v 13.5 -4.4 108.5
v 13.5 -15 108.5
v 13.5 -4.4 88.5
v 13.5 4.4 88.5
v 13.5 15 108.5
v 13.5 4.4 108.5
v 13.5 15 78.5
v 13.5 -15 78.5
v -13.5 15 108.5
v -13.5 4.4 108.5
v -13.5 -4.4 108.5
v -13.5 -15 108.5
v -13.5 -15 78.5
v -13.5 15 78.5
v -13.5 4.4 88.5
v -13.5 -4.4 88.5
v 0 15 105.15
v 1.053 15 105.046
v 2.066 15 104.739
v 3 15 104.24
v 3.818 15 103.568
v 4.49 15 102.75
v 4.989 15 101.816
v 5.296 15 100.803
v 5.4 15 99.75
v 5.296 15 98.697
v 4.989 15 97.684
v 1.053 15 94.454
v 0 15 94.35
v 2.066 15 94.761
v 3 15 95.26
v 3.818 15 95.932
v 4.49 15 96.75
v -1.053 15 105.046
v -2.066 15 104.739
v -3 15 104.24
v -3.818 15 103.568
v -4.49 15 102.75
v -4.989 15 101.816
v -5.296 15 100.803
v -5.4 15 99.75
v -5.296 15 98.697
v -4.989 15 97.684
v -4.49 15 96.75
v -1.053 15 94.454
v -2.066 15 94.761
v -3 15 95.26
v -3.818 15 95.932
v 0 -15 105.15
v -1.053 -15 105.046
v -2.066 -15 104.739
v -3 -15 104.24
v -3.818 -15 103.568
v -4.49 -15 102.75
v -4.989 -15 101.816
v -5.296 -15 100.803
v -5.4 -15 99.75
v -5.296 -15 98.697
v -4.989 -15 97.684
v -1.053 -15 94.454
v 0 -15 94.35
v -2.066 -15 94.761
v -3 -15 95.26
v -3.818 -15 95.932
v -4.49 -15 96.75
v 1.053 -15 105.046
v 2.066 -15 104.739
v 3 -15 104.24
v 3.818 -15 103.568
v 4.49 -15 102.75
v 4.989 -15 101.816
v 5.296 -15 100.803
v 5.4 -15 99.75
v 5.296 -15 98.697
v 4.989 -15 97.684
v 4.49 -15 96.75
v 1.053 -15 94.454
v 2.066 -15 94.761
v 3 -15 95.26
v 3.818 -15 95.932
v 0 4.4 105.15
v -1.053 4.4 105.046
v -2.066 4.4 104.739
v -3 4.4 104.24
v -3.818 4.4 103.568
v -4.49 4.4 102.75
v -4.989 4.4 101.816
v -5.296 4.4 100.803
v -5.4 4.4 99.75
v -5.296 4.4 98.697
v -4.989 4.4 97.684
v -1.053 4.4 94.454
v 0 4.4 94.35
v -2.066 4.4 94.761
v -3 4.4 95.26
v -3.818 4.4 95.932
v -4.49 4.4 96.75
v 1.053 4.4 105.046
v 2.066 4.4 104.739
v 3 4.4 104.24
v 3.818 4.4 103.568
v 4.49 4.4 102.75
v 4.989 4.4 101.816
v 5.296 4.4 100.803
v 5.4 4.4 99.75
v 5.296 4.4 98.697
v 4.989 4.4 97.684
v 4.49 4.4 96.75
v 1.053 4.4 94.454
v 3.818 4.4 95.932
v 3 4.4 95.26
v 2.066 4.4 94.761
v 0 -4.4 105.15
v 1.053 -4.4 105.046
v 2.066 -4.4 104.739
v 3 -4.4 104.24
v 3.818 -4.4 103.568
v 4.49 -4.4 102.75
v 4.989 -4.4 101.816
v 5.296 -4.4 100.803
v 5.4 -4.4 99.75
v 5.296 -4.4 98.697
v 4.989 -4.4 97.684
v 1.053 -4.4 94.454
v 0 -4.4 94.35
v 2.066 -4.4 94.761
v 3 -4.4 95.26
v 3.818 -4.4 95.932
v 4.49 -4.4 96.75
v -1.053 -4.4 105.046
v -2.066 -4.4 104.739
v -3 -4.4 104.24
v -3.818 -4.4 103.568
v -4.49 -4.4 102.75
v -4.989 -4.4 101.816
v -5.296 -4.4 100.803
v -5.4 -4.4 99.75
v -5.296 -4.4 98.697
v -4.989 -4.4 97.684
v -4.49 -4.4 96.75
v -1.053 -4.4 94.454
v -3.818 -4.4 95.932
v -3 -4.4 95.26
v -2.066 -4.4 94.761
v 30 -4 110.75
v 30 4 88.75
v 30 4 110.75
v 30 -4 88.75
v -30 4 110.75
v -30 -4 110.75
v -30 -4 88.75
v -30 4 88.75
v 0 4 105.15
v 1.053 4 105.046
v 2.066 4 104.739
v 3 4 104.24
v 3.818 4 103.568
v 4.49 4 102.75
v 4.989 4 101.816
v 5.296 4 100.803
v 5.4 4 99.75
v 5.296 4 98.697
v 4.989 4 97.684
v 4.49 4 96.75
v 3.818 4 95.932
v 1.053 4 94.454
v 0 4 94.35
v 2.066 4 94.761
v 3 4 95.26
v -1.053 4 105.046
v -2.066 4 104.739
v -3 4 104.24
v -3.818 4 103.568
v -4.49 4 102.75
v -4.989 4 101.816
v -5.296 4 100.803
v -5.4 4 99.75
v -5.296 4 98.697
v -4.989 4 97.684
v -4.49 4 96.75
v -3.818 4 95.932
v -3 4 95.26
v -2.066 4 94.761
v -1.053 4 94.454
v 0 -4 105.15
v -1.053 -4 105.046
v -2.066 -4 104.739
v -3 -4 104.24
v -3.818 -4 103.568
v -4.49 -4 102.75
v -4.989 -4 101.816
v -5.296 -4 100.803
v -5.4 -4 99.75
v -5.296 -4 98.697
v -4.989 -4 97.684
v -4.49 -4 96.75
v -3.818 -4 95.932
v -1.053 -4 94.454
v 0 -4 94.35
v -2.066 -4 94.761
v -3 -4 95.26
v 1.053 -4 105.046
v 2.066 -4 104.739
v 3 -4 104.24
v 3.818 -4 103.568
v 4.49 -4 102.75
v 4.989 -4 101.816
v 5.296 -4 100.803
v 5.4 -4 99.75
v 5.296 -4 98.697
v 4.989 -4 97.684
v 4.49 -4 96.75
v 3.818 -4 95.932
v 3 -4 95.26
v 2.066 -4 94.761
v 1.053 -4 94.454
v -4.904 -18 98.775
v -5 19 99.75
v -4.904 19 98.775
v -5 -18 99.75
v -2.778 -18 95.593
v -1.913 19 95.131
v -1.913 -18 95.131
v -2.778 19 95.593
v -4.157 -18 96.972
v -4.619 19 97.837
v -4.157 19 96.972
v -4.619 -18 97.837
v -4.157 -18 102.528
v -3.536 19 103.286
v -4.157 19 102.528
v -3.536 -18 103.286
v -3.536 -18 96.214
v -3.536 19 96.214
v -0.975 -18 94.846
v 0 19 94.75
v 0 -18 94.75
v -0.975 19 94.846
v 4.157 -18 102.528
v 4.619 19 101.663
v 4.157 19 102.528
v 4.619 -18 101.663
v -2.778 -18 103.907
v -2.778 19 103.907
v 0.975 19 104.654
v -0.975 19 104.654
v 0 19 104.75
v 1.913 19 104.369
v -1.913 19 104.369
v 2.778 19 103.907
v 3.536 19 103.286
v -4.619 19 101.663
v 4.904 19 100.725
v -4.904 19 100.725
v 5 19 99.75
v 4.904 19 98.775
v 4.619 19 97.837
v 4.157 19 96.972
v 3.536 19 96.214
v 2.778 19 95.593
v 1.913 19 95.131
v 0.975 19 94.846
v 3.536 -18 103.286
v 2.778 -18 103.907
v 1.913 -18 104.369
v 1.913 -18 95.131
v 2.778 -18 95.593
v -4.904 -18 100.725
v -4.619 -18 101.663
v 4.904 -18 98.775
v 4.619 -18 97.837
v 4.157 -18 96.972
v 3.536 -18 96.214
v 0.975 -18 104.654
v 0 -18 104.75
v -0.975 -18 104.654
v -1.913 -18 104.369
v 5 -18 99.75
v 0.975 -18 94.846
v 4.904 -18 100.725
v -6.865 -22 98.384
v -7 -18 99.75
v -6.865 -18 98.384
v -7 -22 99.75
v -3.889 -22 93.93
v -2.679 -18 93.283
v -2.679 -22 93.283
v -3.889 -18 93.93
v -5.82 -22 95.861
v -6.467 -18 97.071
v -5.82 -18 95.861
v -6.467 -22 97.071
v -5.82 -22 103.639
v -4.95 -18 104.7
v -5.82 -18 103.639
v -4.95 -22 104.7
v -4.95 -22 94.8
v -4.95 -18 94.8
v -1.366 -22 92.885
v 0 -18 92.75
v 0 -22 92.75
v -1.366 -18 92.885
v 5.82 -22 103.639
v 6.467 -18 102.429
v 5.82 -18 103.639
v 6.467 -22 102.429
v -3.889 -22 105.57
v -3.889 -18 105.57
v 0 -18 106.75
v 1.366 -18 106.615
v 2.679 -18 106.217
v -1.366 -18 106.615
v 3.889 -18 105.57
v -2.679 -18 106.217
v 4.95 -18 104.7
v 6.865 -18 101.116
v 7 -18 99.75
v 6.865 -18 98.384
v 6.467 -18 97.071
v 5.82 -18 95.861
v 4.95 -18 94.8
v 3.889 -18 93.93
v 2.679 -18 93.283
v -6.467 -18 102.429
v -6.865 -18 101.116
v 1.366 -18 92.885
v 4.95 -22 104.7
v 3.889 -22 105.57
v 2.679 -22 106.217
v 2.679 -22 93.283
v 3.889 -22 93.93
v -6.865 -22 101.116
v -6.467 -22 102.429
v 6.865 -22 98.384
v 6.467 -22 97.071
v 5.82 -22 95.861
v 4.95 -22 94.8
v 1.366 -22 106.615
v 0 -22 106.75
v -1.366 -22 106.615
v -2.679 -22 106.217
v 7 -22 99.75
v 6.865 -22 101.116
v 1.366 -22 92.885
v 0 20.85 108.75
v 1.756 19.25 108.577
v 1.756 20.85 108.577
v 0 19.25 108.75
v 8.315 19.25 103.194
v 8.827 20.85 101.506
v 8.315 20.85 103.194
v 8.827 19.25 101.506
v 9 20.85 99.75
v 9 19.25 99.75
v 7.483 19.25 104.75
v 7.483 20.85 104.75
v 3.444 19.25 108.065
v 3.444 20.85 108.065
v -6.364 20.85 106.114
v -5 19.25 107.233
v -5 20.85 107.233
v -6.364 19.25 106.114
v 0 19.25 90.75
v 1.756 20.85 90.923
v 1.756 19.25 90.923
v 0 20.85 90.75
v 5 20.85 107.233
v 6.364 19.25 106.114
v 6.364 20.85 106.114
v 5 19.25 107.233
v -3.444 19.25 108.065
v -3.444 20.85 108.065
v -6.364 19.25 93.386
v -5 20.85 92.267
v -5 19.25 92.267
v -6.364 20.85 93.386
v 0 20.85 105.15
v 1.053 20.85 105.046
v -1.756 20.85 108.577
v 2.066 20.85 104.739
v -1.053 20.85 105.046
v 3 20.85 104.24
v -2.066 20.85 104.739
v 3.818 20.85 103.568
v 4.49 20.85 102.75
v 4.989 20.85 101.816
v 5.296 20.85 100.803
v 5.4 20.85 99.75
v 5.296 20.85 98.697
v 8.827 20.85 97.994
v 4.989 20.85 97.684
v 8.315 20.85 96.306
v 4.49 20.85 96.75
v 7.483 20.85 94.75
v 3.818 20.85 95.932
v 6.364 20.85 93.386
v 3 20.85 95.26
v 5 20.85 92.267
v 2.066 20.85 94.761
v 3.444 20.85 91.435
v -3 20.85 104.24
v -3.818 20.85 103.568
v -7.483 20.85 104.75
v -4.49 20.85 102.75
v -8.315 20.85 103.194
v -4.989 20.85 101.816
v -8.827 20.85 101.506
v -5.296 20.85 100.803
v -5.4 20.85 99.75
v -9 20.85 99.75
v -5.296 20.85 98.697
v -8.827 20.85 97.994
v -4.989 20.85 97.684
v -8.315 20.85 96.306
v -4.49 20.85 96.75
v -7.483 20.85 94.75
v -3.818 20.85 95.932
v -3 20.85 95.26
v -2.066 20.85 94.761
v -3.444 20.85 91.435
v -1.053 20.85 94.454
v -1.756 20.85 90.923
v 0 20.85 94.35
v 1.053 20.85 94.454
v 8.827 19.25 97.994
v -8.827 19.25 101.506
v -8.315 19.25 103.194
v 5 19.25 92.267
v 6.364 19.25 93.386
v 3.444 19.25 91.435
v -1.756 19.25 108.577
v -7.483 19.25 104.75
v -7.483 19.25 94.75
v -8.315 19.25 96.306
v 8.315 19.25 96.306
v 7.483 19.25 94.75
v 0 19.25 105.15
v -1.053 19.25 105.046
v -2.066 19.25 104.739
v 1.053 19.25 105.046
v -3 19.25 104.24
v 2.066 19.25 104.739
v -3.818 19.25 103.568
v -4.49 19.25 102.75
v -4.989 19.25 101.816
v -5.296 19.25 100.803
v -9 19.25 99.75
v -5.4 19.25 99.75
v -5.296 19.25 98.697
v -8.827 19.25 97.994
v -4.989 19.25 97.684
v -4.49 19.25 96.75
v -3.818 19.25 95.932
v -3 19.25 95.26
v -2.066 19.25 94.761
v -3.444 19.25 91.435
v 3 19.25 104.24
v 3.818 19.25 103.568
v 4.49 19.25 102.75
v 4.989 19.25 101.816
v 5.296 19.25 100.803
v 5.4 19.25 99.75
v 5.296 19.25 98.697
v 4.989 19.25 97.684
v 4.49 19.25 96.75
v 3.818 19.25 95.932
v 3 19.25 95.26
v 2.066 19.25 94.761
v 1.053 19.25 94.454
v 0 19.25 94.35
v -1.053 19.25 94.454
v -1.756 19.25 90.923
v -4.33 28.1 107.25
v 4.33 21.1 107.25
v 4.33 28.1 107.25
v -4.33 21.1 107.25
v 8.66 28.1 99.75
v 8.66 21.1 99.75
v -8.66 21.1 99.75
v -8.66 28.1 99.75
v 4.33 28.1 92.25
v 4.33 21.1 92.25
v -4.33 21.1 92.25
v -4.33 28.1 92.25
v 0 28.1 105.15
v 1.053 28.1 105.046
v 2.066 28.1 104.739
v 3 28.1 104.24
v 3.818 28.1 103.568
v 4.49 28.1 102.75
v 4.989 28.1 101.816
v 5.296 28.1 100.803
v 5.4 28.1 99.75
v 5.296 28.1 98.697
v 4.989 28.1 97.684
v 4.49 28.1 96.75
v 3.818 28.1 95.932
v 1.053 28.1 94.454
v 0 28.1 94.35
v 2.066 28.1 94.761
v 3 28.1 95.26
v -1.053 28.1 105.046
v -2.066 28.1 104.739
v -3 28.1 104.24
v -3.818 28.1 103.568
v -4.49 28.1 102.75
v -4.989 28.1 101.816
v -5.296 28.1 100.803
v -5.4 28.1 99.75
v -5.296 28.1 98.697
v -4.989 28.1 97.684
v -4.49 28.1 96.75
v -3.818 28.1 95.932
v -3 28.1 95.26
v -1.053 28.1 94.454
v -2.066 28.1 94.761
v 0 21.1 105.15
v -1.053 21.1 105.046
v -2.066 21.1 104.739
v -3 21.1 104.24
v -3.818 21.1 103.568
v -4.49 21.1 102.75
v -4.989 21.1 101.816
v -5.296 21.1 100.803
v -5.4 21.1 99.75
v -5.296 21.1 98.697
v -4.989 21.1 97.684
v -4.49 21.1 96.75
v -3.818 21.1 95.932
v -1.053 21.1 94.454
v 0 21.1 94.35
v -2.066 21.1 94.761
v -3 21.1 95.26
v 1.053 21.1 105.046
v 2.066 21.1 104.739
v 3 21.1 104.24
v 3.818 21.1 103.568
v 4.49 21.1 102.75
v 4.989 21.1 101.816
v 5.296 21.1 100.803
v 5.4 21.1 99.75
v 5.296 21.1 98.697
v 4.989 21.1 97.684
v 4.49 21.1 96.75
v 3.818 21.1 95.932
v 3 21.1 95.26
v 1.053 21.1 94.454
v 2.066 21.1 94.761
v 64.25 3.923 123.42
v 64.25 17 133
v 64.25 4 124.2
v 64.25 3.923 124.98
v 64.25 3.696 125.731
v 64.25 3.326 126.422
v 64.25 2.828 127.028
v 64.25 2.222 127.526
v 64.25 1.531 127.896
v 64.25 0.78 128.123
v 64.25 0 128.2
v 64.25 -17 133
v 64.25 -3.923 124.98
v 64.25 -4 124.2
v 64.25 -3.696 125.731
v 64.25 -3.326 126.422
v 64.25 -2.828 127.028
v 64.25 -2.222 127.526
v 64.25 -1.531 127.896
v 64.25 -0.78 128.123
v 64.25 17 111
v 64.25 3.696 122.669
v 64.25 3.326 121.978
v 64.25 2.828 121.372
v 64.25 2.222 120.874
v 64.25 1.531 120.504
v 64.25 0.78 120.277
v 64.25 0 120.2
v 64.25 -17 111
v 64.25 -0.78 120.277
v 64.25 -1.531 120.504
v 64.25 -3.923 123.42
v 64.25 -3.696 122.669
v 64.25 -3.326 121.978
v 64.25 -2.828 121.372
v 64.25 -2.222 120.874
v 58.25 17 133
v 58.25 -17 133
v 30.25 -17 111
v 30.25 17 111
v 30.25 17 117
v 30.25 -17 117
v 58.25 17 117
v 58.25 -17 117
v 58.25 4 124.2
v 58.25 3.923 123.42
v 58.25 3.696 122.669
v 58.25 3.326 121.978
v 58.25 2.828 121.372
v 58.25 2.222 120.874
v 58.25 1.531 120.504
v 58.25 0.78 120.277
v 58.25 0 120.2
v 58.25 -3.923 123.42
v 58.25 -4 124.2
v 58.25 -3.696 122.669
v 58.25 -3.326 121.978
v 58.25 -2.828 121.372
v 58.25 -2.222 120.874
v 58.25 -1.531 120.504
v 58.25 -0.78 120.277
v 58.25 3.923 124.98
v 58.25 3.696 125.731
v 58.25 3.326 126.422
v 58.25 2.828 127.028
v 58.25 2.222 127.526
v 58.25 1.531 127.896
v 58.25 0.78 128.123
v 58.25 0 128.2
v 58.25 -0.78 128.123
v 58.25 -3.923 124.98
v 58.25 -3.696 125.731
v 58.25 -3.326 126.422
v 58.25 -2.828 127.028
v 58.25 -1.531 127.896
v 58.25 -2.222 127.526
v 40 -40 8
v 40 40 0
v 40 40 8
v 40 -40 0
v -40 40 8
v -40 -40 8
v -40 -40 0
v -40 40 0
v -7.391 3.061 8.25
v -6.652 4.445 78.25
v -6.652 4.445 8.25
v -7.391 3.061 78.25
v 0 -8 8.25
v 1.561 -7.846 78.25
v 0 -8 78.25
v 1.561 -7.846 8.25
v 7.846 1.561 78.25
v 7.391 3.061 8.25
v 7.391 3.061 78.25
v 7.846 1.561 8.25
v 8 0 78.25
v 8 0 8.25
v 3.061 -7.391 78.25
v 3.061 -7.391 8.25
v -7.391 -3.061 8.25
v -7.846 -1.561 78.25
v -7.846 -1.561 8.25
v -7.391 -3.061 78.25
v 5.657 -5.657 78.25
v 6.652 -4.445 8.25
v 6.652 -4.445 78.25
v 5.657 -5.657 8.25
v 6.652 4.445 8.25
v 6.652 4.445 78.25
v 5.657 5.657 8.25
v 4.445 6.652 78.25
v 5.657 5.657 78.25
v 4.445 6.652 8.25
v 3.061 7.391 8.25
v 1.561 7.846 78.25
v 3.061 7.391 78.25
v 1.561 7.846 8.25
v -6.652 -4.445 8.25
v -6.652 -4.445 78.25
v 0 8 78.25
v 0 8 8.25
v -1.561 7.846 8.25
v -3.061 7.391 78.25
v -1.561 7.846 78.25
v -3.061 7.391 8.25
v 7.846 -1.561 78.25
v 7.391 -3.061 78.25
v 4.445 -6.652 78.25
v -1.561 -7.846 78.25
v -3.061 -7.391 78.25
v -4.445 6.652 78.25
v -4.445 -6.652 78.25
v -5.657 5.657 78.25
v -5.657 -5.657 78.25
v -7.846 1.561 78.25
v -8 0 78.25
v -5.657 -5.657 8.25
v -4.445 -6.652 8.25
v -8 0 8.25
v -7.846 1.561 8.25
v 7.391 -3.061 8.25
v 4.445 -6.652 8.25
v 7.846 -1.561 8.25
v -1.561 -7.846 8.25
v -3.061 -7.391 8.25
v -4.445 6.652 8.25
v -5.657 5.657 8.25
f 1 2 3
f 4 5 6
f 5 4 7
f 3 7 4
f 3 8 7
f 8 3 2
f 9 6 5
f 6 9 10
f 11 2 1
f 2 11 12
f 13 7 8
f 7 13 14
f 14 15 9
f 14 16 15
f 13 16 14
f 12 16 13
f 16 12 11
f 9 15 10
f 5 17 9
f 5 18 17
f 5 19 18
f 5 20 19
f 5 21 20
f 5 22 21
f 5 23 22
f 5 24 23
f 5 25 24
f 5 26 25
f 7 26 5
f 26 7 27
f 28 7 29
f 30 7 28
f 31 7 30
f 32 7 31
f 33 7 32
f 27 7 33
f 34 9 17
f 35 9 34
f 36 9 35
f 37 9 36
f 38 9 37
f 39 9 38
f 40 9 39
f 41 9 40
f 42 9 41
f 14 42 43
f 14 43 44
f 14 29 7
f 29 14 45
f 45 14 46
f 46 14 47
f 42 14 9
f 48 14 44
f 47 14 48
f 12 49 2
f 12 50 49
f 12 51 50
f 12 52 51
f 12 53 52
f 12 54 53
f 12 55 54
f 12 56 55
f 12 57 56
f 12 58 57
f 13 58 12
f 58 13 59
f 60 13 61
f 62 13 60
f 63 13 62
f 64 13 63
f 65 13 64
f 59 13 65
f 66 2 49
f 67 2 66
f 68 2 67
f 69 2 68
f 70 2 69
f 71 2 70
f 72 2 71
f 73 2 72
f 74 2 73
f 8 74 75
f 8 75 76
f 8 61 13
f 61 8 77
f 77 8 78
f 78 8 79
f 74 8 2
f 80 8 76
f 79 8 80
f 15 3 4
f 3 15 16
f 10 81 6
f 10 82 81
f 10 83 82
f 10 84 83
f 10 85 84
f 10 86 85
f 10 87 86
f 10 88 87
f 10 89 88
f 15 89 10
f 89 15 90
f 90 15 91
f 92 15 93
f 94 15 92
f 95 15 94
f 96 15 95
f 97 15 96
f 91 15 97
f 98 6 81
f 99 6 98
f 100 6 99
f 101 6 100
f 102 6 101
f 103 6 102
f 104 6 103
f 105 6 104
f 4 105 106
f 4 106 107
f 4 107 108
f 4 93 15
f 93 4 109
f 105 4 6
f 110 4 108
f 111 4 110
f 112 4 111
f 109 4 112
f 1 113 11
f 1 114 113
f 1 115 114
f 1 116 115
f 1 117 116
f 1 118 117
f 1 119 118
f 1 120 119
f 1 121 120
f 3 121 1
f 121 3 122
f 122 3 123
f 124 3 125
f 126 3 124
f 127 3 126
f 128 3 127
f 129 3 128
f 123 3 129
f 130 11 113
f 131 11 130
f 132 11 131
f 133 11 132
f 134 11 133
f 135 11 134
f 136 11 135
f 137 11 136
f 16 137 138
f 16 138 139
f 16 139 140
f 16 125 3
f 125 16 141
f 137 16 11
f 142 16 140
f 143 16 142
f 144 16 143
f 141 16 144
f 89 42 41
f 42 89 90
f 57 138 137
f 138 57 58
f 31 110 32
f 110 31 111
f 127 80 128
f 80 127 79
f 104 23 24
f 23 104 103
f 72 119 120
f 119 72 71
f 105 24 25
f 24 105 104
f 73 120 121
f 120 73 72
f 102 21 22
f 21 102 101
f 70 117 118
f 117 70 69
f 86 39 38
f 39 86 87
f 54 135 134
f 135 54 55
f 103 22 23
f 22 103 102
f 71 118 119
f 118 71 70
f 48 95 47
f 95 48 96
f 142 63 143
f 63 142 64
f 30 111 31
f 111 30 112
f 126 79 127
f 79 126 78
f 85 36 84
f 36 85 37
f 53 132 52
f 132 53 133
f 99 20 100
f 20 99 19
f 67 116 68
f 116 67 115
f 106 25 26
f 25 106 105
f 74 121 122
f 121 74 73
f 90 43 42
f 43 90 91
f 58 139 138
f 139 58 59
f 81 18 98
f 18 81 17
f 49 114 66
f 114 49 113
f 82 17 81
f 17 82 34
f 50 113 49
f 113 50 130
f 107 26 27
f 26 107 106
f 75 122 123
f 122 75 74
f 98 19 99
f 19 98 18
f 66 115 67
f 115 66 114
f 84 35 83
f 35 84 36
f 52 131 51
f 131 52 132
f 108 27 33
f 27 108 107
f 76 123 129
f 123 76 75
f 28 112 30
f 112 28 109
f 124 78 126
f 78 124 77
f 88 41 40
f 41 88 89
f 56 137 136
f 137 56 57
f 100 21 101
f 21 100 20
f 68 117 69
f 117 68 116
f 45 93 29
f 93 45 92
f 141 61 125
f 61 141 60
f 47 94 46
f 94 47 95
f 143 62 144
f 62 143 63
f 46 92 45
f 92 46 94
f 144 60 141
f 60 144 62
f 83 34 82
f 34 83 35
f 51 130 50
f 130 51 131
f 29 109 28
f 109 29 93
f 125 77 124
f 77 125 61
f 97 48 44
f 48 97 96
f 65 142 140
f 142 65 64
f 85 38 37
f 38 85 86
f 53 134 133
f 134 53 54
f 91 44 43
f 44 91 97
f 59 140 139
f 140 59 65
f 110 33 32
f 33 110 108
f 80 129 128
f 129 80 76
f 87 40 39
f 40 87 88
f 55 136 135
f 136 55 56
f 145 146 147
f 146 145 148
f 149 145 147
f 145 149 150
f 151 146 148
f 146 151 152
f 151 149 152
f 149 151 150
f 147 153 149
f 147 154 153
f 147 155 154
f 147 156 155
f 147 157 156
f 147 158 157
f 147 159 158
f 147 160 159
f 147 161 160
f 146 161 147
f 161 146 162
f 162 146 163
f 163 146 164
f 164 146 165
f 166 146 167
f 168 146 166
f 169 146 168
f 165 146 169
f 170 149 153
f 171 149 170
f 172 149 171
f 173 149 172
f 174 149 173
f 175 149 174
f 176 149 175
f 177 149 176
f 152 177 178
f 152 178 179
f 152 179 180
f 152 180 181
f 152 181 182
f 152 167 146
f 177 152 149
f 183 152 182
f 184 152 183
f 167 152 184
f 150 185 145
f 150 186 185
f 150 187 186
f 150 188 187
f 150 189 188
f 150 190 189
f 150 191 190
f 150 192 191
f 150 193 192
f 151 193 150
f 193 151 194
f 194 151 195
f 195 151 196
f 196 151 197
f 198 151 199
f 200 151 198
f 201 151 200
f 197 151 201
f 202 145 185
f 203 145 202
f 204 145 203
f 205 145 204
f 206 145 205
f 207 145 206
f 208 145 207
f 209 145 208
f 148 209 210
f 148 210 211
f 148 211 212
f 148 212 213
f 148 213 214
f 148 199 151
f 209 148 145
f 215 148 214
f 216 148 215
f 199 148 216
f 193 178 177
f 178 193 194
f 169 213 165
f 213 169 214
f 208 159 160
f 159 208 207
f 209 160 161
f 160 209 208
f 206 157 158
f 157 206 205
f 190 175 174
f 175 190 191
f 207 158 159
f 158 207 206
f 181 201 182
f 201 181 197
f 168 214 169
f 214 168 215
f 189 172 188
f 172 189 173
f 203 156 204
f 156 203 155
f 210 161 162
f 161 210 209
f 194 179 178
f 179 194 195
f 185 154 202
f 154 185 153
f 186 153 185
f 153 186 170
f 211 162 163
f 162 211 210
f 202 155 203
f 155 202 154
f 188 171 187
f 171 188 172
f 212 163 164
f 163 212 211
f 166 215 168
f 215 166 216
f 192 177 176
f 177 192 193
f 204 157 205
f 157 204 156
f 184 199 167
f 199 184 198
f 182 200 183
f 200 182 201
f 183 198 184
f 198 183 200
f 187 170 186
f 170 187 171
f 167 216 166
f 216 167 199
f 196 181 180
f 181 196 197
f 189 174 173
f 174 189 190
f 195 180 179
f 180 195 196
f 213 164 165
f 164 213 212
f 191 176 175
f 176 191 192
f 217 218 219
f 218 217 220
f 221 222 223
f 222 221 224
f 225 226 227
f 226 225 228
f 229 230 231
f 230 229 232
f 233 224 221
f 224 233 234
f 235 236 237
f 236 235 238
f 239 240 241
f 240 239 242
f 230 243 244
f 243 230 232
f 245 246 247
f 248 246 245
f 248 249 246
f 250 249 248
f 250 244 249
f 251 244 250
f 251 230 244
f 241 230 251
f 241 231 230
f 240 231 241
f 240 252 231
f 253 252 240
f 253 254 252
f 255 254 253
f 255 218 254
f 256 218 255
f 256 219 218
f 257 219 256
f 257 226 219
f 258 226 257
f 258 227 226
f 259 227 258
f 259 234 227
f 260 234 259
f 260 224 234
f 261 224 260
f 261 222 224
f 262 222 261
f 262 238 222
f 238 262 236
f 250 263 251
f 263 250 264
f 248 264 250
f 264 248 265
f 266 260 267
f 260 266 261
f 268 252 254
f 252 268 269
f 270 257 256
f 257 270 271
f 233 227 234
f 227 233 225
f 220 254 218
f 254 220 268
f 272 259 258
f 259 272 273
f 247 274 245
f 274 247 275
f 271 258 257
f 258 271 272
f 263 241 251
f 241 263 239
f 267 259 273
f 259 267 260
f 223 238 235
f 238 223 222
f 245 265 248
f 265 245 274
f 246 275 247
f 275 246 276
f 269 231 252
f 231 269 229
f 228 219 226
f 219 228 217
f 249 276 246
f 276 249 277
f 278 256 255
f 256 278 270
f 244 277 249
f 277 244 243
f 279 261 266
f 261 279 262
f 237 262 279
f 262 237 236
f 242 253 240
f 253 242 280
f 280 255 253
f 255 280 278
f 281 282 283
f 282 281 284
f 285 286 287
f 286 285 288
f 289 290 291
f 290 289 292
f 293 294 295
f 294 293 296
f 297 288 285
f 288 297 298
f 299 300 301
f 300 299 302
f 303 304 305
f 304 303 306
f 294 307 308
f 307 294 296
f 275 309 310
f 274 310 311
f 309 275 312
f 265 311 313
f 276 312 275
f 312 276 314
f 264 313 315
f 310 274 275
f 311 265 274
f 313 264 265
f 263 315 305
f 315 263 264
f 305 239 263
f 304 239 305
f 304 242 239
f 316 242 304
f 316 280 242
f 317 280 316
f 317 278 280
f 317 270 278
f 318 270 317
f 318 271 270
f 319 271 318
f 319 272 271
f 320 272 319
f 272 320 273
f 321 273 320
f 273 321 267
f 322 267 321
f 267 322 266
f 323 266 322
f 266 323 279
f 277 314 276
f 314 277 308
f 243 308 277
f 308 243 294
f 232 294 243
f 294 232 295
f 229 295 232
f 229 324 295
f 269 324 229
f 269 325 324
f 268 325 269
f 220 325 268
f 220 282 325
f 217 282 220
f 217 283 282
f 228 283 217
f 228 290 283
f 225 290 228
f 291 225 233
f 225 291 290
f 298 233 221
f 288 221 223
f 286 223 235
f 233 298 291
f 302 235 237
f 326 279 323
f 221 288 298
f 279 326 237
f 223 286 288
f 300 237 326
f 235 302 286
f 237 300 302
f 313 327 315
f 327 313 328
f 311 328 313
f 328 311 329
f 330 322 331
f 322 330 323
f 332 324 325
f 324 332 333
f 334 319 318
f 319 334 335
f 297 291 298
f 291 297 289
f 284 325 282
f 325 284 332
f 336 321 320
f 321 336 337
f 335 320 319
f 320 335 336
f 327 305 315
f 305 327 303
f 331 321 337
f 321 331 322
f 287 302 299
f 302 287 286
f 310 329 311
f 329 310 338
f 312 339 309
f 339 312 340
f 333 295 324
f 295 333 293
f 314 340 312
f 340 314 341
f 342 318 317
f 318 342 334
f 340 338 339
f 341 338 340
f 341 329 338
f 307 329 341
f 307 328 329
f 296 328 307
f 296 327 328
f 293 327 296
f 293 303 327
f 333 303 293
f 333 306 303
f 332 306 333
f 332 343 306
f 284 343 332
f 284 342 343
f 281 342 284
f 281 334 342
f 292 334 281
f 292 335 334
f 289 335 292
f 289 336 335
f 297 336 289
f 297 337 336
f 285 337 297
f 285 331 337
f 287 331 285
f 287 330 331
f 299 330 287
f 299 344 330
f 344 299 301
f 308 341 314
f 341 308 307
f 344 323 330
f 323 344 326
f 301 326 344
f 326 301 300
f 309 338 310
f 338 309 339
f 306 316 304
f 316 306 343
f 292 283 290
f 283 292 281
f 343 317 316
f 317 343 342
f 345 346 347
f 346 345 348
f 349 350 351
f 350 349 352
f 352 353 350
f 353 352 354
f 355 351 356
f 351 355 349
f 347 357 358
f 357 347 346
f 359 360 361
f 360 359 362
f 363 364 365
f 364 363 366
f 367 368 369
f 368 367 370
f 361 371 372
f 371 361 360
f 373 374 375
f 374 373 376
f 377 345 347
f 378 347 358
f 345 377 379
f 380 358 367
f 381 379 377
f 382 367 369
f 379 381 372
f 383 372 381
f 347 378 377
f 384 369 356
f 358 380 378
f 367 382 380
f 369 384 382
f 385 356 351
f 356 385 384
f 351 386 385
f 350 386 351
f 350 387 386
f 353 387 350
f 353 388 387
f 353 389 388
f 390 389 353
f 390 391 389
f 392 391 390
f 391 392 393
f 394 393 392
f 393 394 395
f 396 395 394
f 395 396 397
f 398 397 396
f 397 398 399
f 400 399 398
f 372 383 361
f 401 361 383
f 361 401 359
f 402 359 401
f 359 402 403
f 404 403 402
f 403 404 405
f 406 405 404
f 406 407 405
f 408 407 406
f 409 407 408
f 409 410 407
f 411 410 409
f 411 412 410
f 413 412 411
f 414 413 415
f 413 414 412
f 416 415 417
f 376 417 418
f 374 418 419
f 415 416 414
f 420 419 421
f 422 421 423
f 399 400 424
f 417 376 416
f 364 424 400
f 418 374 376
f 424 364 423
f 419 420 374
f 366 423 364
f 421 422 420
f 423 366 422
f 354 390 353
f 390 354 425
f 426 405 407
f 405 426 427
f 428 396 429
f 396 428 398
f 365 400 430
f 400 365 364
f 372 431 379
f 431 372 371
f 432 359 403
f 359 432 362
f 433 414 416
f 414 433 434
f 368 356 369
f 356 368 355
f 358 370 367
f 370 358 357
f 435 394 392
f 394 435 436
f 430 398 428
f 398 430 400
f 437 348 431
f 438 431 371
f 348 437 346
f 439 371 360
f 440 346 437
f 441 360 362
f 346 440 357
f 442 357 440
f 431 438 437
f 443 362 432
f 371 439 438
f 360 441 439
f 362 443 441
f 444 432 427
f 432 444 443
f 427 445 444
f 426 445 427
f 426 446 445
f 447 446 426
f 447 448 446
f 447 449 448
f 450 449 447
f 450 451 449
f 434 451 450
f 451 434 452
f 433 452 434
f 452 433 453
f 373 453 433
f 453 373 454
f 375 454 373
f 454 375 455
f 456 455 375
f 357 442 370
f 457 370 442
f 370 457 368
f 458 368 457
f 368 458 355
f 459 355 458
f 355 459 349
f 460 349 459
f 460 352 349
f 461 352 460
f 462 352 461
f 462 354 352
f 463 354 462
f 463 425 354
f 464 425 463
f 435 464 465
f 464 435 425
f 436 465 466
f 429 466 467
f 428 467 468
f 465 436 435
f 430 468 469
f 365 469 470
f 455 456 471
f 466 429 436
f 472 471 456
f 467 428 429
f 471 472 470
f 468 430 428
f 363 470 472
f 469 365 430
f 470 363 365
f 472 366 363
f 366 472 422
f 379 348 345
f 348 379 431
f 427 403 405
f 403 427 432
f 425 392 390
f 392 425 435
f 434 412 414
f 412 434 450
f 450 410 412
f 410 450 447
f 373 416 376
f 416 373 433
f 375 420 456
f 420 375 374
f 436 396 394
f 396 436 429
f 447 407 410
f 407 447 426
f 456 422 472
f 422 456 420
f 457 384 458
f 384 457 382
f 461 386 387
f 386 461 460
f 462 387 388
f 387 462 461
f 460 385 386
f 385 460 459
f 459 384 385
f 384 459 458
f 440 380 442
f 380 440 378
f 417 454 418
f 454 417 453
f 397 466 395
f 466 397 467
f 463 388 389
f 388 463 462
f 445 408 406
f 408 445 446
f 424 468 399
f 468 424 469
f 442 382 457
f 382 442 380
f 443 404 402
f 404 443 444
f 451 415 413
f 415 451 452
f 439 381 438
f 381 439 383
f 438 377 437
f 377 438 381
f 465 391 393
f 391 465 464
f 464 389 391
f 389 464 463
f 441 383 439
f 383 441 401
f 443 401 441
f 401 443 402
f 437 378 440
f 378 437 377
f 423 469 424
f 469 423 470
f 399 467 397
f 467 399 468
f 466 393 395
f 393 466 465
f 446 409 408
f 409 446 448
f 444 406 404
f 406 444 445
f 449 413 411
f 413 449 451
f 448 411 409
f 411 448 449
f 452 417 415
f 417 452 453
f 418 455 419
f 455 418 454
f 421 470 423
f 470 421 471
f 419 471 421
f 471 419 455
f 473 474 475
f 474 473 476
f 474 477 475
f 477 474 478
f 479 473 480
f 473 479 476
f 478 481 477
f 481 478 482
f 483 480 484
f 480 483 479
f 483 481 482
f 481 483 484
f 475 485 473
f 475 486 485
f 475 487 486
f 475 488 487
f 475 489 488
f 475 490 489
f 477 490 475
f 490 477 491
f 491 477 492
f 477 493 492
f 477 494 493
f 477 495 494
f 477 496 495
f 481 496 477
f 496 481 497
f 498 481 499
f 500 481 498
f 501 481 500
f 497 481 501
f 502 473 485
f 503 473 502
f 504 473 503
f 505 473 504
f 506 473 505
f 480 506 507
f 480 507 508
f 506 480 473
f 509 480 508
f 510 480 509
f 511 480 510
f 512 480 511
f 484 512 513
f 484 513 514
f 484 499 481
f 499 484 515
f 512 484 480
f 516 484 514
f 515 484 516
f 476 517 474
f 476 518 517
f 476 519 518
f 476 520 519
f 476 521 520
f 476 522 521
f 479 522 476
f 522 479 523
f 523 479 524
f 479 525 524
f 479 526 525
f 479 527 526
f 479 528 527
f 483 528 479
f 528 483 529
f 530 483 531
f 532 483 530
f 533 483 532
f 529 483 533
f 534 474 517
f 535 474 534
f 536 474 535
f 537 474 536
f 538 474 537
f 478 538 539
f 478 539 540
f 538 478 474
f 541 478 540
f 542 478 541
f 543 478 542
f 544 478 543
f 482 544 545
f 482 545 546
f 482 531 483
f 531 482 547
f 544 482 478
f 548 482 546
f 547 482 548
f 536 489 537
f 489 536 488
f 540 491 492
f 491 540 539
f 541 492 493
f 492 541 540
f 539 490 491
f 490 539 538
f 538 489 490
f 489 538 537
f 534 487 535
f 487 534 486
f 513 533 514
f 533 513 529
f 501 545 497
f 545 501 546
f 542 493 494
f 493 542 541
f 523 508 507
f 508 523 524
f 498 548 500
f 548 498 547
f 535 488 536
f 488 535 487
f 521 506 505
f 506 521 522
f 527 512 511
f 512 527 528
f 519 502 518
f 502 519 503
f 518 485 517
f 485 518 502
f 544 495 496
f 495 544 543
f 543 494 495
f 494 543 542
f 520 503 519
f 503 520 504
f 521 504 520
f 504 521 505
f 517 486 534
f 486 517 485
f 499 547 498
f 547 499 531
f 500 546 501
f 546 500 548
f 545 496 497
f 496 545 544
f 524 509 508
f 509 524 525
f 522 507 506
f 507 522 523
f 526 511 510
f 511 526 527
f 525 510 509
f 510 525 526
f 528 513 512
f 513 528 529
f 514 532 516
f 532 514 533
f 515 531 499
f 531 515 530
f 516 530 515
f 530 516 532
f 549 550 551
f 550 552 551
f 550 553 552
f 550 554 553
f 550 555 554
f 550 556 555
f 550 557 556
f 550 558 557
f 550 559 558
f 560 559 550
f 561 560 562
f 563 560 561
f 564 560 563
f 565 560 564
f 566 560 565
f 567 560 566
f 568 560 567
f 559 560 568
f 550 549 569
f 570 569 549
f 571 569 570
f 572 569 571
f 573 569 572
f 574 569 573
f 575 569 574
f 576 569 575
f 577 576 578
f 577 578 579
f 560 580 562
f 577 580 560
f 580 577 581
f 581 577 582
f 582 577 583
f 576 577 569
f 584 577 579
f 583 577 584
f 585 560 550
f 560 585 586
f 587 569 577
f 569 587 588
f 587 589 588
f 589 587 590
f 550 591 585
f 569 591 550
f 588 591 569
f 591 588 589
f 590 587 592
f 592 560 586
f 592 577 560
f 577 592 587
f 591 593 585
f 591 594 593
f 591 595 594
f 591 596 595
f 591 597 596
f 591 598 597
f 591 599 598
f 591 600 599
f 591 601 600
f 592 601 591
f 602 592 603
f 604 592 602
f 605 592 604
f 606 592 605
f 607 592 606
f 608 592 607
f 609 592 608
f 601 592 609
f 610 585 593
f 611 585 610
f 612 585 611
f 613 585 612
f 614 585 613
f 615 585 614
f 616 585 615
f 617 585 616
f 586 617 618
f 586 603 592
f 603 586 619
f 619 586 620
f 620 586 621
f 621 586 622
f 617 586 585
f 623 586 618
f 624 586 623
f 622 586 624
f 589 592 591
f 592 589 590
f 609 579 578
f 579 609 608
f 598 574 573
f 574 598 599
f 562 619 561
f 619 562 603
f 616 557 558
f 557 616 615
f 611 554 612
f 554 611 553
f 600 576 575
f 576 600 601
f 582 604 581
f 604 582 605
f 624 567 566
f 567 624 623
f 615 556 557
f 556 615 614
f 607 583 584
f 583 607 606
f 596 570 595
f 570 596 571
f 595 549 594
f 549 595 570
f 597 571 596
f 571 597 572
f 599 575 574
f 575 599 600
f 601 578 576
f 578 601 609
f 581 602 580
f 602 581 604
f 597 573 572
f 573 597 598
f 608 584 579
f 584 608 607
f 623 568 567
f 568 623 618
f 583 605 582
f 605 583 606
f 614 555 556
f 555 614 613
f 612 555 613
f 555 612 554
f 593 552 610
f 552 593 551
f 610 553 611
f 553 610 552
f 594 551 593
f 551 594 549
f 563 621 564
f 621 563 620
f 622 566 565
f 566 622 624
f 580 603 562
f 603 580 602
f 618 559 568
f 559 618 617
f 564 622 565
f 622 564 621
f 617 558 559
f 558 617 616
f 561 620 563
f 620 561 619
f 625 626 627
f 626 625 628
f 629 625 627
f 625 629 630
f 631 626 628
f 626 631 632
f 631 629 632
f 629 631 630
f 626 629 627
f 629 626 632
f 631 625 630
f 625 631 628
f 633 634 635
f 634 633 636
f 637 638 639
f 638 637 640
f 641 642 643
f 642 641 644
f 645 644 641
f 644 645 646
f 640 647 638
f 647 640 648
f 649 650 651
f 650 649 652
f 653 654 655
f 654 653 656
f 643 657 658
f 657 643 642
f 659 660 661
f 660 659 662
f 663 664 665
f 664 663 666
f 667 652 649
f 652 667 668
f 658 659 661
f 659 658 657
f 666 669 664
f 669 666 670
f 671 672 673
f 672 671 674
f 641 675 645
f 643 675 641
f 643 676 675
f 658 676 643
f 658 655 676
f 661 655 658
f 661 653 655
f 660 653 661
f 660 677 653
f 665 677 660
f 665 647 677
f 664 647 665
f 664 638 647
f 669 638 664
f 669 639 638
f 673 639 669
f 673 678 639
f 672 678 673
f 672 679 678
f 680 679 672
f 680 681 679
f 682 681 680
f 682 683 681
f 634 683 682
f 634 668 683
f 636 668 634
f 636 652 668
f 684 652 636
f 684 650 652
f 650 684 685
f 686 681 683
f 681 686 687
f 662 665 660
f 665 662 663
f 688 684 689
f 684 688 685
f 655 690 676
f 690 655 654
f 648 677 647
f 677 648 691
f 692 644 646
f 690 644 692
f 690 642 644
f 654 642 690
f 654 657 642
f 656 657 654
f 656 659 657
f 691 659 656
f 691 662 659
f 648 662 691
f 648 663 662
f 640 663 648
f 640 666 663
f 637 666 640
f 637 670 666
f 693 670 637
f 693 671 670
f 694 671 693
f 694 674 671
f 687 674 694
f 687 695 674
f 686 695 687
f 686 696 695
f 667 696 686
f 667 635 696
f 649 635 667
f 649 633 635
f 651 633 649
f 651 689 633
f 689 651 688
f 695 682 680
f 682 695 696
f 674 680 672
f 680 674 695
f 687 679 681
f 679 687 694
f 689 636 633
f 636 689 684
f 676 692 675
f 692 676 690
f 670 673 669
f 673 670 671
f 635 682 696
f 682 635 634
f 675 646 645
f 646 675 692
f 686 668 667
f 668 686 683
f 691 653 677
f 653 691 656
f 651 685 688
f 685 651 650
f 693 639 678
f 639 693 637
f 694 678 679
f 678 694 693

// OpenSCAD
$fn = 32;

// ------------------------------------------------------------------------
// Lamp arm: column d16 x 70 mm, arm 60 mm
// Every part is its own module, assembly() places every instance.
// ------------------------------------------------------------------------

// --- part 1 ---
module lamp_base() {
  difference() {
    translate([-40, -40, 0]) cube([80, 80, 8]);
  }
}

// --- part 2 ---
module lamp_column() {
  cylinder(h = 70, d = 16);
}

// --- part 3 ---
module head_fork() {
  difference() {
    translate([-13.5, -15, 0]) cube([27, 30, 30]);
    translate([-14.5, -4.4, 10]) cube([29, 8.8, 21]);
    translate([0, 0, 21.25]) rotate([90, 0, 0]) cylinder(h = 32, d = 10.8, center = true);
  }
}

// --- part 4 ---
module lamp_arm() {
  difference() {
    translate([-30, -4, 0]) cube([60, 8, 22]);
    translate([0, 0, 11]) rotate([90, 0, 0]) cylinder(h = 10, d = 10.8, center = true);
  }
}

// --- part 5 ---
module arm_pin() {
  rotate([0, 90, 0]) cylinder(h = 38, d = 10, center = true);
  translate([-22, 0, 0]) rotate([0, 90, 0]) cylinder(h = 4, d = 14);
}

// --- part 6 ---
module arm_washer() {
  difference() {
      translate([0, 0, 0]) cylinder(h = 1.6, d = 18);
      translate([0, 0, -1]) cylinder(h = 3.6, d = 10.8);
    }
}

// --- part 7 ---
module arm_nut() {
  difference() {
    linear_extrude(height = 7) polygon(points = [[8.66, 0], [4.33, 7.5], [-4.33, 7.5], [-8.66, 0], [-4.33, -7.5], [4.33, -7.5]]);
    translate([0, 0, -1]) cylinder(h = 9, d = 10.8);
  }
}

// --- part 8 ---
module shade_bracket() {
  difference() {
    translate([-17, -17, 0]) cube([34, 34, 22]);
    translate([-18, -18, 6]) cube([29, 36, 17]);
    translate([14, 0, 13.2]) rotate([0, 90, 0]) cylinder(h = 8, d = 8, center = true);
  }
}

// --- assembly ---
module assembly() {
  color([0.80, 0.24, 0.20]) translate([0, 0, 0]) rotate([0, 0, 0]) lamp_base();
  color([0.20, 0.45, 0.75]) translate([0, 0, 8.25]) rotate([0, 0, 0]) lamp_column();
  color([0.25, 0.62, 0.32]) translate([0, 0, 78.5]) rotate([0, 0, 0]) head_fork();
  color([0.92, 0.70, 0.18]) translate([0, 0, 88.75]) rotate([0, 0, 0]) lamp_arm();
  color([0.58, 0.35, 0.70]) translate([0, 0, 99.75]) rotate([0, 0, 90]) arm_pin();
  color([0.16, 0.66, 0.66]) translate([0, 20.85, 99.75]) rotate([90, 0, 0]) arm_washer();
  color([0.85, 0.48, 0.18]) translate([0, 28.1, 99.75]) rotate([90, 0, 0]) arm_nut();
  color([0.55, 0.60, 0.65]) translate([47.25, 0, 111]) rotate([0, 0, 0]) shade_bracket();
}

assembly();
